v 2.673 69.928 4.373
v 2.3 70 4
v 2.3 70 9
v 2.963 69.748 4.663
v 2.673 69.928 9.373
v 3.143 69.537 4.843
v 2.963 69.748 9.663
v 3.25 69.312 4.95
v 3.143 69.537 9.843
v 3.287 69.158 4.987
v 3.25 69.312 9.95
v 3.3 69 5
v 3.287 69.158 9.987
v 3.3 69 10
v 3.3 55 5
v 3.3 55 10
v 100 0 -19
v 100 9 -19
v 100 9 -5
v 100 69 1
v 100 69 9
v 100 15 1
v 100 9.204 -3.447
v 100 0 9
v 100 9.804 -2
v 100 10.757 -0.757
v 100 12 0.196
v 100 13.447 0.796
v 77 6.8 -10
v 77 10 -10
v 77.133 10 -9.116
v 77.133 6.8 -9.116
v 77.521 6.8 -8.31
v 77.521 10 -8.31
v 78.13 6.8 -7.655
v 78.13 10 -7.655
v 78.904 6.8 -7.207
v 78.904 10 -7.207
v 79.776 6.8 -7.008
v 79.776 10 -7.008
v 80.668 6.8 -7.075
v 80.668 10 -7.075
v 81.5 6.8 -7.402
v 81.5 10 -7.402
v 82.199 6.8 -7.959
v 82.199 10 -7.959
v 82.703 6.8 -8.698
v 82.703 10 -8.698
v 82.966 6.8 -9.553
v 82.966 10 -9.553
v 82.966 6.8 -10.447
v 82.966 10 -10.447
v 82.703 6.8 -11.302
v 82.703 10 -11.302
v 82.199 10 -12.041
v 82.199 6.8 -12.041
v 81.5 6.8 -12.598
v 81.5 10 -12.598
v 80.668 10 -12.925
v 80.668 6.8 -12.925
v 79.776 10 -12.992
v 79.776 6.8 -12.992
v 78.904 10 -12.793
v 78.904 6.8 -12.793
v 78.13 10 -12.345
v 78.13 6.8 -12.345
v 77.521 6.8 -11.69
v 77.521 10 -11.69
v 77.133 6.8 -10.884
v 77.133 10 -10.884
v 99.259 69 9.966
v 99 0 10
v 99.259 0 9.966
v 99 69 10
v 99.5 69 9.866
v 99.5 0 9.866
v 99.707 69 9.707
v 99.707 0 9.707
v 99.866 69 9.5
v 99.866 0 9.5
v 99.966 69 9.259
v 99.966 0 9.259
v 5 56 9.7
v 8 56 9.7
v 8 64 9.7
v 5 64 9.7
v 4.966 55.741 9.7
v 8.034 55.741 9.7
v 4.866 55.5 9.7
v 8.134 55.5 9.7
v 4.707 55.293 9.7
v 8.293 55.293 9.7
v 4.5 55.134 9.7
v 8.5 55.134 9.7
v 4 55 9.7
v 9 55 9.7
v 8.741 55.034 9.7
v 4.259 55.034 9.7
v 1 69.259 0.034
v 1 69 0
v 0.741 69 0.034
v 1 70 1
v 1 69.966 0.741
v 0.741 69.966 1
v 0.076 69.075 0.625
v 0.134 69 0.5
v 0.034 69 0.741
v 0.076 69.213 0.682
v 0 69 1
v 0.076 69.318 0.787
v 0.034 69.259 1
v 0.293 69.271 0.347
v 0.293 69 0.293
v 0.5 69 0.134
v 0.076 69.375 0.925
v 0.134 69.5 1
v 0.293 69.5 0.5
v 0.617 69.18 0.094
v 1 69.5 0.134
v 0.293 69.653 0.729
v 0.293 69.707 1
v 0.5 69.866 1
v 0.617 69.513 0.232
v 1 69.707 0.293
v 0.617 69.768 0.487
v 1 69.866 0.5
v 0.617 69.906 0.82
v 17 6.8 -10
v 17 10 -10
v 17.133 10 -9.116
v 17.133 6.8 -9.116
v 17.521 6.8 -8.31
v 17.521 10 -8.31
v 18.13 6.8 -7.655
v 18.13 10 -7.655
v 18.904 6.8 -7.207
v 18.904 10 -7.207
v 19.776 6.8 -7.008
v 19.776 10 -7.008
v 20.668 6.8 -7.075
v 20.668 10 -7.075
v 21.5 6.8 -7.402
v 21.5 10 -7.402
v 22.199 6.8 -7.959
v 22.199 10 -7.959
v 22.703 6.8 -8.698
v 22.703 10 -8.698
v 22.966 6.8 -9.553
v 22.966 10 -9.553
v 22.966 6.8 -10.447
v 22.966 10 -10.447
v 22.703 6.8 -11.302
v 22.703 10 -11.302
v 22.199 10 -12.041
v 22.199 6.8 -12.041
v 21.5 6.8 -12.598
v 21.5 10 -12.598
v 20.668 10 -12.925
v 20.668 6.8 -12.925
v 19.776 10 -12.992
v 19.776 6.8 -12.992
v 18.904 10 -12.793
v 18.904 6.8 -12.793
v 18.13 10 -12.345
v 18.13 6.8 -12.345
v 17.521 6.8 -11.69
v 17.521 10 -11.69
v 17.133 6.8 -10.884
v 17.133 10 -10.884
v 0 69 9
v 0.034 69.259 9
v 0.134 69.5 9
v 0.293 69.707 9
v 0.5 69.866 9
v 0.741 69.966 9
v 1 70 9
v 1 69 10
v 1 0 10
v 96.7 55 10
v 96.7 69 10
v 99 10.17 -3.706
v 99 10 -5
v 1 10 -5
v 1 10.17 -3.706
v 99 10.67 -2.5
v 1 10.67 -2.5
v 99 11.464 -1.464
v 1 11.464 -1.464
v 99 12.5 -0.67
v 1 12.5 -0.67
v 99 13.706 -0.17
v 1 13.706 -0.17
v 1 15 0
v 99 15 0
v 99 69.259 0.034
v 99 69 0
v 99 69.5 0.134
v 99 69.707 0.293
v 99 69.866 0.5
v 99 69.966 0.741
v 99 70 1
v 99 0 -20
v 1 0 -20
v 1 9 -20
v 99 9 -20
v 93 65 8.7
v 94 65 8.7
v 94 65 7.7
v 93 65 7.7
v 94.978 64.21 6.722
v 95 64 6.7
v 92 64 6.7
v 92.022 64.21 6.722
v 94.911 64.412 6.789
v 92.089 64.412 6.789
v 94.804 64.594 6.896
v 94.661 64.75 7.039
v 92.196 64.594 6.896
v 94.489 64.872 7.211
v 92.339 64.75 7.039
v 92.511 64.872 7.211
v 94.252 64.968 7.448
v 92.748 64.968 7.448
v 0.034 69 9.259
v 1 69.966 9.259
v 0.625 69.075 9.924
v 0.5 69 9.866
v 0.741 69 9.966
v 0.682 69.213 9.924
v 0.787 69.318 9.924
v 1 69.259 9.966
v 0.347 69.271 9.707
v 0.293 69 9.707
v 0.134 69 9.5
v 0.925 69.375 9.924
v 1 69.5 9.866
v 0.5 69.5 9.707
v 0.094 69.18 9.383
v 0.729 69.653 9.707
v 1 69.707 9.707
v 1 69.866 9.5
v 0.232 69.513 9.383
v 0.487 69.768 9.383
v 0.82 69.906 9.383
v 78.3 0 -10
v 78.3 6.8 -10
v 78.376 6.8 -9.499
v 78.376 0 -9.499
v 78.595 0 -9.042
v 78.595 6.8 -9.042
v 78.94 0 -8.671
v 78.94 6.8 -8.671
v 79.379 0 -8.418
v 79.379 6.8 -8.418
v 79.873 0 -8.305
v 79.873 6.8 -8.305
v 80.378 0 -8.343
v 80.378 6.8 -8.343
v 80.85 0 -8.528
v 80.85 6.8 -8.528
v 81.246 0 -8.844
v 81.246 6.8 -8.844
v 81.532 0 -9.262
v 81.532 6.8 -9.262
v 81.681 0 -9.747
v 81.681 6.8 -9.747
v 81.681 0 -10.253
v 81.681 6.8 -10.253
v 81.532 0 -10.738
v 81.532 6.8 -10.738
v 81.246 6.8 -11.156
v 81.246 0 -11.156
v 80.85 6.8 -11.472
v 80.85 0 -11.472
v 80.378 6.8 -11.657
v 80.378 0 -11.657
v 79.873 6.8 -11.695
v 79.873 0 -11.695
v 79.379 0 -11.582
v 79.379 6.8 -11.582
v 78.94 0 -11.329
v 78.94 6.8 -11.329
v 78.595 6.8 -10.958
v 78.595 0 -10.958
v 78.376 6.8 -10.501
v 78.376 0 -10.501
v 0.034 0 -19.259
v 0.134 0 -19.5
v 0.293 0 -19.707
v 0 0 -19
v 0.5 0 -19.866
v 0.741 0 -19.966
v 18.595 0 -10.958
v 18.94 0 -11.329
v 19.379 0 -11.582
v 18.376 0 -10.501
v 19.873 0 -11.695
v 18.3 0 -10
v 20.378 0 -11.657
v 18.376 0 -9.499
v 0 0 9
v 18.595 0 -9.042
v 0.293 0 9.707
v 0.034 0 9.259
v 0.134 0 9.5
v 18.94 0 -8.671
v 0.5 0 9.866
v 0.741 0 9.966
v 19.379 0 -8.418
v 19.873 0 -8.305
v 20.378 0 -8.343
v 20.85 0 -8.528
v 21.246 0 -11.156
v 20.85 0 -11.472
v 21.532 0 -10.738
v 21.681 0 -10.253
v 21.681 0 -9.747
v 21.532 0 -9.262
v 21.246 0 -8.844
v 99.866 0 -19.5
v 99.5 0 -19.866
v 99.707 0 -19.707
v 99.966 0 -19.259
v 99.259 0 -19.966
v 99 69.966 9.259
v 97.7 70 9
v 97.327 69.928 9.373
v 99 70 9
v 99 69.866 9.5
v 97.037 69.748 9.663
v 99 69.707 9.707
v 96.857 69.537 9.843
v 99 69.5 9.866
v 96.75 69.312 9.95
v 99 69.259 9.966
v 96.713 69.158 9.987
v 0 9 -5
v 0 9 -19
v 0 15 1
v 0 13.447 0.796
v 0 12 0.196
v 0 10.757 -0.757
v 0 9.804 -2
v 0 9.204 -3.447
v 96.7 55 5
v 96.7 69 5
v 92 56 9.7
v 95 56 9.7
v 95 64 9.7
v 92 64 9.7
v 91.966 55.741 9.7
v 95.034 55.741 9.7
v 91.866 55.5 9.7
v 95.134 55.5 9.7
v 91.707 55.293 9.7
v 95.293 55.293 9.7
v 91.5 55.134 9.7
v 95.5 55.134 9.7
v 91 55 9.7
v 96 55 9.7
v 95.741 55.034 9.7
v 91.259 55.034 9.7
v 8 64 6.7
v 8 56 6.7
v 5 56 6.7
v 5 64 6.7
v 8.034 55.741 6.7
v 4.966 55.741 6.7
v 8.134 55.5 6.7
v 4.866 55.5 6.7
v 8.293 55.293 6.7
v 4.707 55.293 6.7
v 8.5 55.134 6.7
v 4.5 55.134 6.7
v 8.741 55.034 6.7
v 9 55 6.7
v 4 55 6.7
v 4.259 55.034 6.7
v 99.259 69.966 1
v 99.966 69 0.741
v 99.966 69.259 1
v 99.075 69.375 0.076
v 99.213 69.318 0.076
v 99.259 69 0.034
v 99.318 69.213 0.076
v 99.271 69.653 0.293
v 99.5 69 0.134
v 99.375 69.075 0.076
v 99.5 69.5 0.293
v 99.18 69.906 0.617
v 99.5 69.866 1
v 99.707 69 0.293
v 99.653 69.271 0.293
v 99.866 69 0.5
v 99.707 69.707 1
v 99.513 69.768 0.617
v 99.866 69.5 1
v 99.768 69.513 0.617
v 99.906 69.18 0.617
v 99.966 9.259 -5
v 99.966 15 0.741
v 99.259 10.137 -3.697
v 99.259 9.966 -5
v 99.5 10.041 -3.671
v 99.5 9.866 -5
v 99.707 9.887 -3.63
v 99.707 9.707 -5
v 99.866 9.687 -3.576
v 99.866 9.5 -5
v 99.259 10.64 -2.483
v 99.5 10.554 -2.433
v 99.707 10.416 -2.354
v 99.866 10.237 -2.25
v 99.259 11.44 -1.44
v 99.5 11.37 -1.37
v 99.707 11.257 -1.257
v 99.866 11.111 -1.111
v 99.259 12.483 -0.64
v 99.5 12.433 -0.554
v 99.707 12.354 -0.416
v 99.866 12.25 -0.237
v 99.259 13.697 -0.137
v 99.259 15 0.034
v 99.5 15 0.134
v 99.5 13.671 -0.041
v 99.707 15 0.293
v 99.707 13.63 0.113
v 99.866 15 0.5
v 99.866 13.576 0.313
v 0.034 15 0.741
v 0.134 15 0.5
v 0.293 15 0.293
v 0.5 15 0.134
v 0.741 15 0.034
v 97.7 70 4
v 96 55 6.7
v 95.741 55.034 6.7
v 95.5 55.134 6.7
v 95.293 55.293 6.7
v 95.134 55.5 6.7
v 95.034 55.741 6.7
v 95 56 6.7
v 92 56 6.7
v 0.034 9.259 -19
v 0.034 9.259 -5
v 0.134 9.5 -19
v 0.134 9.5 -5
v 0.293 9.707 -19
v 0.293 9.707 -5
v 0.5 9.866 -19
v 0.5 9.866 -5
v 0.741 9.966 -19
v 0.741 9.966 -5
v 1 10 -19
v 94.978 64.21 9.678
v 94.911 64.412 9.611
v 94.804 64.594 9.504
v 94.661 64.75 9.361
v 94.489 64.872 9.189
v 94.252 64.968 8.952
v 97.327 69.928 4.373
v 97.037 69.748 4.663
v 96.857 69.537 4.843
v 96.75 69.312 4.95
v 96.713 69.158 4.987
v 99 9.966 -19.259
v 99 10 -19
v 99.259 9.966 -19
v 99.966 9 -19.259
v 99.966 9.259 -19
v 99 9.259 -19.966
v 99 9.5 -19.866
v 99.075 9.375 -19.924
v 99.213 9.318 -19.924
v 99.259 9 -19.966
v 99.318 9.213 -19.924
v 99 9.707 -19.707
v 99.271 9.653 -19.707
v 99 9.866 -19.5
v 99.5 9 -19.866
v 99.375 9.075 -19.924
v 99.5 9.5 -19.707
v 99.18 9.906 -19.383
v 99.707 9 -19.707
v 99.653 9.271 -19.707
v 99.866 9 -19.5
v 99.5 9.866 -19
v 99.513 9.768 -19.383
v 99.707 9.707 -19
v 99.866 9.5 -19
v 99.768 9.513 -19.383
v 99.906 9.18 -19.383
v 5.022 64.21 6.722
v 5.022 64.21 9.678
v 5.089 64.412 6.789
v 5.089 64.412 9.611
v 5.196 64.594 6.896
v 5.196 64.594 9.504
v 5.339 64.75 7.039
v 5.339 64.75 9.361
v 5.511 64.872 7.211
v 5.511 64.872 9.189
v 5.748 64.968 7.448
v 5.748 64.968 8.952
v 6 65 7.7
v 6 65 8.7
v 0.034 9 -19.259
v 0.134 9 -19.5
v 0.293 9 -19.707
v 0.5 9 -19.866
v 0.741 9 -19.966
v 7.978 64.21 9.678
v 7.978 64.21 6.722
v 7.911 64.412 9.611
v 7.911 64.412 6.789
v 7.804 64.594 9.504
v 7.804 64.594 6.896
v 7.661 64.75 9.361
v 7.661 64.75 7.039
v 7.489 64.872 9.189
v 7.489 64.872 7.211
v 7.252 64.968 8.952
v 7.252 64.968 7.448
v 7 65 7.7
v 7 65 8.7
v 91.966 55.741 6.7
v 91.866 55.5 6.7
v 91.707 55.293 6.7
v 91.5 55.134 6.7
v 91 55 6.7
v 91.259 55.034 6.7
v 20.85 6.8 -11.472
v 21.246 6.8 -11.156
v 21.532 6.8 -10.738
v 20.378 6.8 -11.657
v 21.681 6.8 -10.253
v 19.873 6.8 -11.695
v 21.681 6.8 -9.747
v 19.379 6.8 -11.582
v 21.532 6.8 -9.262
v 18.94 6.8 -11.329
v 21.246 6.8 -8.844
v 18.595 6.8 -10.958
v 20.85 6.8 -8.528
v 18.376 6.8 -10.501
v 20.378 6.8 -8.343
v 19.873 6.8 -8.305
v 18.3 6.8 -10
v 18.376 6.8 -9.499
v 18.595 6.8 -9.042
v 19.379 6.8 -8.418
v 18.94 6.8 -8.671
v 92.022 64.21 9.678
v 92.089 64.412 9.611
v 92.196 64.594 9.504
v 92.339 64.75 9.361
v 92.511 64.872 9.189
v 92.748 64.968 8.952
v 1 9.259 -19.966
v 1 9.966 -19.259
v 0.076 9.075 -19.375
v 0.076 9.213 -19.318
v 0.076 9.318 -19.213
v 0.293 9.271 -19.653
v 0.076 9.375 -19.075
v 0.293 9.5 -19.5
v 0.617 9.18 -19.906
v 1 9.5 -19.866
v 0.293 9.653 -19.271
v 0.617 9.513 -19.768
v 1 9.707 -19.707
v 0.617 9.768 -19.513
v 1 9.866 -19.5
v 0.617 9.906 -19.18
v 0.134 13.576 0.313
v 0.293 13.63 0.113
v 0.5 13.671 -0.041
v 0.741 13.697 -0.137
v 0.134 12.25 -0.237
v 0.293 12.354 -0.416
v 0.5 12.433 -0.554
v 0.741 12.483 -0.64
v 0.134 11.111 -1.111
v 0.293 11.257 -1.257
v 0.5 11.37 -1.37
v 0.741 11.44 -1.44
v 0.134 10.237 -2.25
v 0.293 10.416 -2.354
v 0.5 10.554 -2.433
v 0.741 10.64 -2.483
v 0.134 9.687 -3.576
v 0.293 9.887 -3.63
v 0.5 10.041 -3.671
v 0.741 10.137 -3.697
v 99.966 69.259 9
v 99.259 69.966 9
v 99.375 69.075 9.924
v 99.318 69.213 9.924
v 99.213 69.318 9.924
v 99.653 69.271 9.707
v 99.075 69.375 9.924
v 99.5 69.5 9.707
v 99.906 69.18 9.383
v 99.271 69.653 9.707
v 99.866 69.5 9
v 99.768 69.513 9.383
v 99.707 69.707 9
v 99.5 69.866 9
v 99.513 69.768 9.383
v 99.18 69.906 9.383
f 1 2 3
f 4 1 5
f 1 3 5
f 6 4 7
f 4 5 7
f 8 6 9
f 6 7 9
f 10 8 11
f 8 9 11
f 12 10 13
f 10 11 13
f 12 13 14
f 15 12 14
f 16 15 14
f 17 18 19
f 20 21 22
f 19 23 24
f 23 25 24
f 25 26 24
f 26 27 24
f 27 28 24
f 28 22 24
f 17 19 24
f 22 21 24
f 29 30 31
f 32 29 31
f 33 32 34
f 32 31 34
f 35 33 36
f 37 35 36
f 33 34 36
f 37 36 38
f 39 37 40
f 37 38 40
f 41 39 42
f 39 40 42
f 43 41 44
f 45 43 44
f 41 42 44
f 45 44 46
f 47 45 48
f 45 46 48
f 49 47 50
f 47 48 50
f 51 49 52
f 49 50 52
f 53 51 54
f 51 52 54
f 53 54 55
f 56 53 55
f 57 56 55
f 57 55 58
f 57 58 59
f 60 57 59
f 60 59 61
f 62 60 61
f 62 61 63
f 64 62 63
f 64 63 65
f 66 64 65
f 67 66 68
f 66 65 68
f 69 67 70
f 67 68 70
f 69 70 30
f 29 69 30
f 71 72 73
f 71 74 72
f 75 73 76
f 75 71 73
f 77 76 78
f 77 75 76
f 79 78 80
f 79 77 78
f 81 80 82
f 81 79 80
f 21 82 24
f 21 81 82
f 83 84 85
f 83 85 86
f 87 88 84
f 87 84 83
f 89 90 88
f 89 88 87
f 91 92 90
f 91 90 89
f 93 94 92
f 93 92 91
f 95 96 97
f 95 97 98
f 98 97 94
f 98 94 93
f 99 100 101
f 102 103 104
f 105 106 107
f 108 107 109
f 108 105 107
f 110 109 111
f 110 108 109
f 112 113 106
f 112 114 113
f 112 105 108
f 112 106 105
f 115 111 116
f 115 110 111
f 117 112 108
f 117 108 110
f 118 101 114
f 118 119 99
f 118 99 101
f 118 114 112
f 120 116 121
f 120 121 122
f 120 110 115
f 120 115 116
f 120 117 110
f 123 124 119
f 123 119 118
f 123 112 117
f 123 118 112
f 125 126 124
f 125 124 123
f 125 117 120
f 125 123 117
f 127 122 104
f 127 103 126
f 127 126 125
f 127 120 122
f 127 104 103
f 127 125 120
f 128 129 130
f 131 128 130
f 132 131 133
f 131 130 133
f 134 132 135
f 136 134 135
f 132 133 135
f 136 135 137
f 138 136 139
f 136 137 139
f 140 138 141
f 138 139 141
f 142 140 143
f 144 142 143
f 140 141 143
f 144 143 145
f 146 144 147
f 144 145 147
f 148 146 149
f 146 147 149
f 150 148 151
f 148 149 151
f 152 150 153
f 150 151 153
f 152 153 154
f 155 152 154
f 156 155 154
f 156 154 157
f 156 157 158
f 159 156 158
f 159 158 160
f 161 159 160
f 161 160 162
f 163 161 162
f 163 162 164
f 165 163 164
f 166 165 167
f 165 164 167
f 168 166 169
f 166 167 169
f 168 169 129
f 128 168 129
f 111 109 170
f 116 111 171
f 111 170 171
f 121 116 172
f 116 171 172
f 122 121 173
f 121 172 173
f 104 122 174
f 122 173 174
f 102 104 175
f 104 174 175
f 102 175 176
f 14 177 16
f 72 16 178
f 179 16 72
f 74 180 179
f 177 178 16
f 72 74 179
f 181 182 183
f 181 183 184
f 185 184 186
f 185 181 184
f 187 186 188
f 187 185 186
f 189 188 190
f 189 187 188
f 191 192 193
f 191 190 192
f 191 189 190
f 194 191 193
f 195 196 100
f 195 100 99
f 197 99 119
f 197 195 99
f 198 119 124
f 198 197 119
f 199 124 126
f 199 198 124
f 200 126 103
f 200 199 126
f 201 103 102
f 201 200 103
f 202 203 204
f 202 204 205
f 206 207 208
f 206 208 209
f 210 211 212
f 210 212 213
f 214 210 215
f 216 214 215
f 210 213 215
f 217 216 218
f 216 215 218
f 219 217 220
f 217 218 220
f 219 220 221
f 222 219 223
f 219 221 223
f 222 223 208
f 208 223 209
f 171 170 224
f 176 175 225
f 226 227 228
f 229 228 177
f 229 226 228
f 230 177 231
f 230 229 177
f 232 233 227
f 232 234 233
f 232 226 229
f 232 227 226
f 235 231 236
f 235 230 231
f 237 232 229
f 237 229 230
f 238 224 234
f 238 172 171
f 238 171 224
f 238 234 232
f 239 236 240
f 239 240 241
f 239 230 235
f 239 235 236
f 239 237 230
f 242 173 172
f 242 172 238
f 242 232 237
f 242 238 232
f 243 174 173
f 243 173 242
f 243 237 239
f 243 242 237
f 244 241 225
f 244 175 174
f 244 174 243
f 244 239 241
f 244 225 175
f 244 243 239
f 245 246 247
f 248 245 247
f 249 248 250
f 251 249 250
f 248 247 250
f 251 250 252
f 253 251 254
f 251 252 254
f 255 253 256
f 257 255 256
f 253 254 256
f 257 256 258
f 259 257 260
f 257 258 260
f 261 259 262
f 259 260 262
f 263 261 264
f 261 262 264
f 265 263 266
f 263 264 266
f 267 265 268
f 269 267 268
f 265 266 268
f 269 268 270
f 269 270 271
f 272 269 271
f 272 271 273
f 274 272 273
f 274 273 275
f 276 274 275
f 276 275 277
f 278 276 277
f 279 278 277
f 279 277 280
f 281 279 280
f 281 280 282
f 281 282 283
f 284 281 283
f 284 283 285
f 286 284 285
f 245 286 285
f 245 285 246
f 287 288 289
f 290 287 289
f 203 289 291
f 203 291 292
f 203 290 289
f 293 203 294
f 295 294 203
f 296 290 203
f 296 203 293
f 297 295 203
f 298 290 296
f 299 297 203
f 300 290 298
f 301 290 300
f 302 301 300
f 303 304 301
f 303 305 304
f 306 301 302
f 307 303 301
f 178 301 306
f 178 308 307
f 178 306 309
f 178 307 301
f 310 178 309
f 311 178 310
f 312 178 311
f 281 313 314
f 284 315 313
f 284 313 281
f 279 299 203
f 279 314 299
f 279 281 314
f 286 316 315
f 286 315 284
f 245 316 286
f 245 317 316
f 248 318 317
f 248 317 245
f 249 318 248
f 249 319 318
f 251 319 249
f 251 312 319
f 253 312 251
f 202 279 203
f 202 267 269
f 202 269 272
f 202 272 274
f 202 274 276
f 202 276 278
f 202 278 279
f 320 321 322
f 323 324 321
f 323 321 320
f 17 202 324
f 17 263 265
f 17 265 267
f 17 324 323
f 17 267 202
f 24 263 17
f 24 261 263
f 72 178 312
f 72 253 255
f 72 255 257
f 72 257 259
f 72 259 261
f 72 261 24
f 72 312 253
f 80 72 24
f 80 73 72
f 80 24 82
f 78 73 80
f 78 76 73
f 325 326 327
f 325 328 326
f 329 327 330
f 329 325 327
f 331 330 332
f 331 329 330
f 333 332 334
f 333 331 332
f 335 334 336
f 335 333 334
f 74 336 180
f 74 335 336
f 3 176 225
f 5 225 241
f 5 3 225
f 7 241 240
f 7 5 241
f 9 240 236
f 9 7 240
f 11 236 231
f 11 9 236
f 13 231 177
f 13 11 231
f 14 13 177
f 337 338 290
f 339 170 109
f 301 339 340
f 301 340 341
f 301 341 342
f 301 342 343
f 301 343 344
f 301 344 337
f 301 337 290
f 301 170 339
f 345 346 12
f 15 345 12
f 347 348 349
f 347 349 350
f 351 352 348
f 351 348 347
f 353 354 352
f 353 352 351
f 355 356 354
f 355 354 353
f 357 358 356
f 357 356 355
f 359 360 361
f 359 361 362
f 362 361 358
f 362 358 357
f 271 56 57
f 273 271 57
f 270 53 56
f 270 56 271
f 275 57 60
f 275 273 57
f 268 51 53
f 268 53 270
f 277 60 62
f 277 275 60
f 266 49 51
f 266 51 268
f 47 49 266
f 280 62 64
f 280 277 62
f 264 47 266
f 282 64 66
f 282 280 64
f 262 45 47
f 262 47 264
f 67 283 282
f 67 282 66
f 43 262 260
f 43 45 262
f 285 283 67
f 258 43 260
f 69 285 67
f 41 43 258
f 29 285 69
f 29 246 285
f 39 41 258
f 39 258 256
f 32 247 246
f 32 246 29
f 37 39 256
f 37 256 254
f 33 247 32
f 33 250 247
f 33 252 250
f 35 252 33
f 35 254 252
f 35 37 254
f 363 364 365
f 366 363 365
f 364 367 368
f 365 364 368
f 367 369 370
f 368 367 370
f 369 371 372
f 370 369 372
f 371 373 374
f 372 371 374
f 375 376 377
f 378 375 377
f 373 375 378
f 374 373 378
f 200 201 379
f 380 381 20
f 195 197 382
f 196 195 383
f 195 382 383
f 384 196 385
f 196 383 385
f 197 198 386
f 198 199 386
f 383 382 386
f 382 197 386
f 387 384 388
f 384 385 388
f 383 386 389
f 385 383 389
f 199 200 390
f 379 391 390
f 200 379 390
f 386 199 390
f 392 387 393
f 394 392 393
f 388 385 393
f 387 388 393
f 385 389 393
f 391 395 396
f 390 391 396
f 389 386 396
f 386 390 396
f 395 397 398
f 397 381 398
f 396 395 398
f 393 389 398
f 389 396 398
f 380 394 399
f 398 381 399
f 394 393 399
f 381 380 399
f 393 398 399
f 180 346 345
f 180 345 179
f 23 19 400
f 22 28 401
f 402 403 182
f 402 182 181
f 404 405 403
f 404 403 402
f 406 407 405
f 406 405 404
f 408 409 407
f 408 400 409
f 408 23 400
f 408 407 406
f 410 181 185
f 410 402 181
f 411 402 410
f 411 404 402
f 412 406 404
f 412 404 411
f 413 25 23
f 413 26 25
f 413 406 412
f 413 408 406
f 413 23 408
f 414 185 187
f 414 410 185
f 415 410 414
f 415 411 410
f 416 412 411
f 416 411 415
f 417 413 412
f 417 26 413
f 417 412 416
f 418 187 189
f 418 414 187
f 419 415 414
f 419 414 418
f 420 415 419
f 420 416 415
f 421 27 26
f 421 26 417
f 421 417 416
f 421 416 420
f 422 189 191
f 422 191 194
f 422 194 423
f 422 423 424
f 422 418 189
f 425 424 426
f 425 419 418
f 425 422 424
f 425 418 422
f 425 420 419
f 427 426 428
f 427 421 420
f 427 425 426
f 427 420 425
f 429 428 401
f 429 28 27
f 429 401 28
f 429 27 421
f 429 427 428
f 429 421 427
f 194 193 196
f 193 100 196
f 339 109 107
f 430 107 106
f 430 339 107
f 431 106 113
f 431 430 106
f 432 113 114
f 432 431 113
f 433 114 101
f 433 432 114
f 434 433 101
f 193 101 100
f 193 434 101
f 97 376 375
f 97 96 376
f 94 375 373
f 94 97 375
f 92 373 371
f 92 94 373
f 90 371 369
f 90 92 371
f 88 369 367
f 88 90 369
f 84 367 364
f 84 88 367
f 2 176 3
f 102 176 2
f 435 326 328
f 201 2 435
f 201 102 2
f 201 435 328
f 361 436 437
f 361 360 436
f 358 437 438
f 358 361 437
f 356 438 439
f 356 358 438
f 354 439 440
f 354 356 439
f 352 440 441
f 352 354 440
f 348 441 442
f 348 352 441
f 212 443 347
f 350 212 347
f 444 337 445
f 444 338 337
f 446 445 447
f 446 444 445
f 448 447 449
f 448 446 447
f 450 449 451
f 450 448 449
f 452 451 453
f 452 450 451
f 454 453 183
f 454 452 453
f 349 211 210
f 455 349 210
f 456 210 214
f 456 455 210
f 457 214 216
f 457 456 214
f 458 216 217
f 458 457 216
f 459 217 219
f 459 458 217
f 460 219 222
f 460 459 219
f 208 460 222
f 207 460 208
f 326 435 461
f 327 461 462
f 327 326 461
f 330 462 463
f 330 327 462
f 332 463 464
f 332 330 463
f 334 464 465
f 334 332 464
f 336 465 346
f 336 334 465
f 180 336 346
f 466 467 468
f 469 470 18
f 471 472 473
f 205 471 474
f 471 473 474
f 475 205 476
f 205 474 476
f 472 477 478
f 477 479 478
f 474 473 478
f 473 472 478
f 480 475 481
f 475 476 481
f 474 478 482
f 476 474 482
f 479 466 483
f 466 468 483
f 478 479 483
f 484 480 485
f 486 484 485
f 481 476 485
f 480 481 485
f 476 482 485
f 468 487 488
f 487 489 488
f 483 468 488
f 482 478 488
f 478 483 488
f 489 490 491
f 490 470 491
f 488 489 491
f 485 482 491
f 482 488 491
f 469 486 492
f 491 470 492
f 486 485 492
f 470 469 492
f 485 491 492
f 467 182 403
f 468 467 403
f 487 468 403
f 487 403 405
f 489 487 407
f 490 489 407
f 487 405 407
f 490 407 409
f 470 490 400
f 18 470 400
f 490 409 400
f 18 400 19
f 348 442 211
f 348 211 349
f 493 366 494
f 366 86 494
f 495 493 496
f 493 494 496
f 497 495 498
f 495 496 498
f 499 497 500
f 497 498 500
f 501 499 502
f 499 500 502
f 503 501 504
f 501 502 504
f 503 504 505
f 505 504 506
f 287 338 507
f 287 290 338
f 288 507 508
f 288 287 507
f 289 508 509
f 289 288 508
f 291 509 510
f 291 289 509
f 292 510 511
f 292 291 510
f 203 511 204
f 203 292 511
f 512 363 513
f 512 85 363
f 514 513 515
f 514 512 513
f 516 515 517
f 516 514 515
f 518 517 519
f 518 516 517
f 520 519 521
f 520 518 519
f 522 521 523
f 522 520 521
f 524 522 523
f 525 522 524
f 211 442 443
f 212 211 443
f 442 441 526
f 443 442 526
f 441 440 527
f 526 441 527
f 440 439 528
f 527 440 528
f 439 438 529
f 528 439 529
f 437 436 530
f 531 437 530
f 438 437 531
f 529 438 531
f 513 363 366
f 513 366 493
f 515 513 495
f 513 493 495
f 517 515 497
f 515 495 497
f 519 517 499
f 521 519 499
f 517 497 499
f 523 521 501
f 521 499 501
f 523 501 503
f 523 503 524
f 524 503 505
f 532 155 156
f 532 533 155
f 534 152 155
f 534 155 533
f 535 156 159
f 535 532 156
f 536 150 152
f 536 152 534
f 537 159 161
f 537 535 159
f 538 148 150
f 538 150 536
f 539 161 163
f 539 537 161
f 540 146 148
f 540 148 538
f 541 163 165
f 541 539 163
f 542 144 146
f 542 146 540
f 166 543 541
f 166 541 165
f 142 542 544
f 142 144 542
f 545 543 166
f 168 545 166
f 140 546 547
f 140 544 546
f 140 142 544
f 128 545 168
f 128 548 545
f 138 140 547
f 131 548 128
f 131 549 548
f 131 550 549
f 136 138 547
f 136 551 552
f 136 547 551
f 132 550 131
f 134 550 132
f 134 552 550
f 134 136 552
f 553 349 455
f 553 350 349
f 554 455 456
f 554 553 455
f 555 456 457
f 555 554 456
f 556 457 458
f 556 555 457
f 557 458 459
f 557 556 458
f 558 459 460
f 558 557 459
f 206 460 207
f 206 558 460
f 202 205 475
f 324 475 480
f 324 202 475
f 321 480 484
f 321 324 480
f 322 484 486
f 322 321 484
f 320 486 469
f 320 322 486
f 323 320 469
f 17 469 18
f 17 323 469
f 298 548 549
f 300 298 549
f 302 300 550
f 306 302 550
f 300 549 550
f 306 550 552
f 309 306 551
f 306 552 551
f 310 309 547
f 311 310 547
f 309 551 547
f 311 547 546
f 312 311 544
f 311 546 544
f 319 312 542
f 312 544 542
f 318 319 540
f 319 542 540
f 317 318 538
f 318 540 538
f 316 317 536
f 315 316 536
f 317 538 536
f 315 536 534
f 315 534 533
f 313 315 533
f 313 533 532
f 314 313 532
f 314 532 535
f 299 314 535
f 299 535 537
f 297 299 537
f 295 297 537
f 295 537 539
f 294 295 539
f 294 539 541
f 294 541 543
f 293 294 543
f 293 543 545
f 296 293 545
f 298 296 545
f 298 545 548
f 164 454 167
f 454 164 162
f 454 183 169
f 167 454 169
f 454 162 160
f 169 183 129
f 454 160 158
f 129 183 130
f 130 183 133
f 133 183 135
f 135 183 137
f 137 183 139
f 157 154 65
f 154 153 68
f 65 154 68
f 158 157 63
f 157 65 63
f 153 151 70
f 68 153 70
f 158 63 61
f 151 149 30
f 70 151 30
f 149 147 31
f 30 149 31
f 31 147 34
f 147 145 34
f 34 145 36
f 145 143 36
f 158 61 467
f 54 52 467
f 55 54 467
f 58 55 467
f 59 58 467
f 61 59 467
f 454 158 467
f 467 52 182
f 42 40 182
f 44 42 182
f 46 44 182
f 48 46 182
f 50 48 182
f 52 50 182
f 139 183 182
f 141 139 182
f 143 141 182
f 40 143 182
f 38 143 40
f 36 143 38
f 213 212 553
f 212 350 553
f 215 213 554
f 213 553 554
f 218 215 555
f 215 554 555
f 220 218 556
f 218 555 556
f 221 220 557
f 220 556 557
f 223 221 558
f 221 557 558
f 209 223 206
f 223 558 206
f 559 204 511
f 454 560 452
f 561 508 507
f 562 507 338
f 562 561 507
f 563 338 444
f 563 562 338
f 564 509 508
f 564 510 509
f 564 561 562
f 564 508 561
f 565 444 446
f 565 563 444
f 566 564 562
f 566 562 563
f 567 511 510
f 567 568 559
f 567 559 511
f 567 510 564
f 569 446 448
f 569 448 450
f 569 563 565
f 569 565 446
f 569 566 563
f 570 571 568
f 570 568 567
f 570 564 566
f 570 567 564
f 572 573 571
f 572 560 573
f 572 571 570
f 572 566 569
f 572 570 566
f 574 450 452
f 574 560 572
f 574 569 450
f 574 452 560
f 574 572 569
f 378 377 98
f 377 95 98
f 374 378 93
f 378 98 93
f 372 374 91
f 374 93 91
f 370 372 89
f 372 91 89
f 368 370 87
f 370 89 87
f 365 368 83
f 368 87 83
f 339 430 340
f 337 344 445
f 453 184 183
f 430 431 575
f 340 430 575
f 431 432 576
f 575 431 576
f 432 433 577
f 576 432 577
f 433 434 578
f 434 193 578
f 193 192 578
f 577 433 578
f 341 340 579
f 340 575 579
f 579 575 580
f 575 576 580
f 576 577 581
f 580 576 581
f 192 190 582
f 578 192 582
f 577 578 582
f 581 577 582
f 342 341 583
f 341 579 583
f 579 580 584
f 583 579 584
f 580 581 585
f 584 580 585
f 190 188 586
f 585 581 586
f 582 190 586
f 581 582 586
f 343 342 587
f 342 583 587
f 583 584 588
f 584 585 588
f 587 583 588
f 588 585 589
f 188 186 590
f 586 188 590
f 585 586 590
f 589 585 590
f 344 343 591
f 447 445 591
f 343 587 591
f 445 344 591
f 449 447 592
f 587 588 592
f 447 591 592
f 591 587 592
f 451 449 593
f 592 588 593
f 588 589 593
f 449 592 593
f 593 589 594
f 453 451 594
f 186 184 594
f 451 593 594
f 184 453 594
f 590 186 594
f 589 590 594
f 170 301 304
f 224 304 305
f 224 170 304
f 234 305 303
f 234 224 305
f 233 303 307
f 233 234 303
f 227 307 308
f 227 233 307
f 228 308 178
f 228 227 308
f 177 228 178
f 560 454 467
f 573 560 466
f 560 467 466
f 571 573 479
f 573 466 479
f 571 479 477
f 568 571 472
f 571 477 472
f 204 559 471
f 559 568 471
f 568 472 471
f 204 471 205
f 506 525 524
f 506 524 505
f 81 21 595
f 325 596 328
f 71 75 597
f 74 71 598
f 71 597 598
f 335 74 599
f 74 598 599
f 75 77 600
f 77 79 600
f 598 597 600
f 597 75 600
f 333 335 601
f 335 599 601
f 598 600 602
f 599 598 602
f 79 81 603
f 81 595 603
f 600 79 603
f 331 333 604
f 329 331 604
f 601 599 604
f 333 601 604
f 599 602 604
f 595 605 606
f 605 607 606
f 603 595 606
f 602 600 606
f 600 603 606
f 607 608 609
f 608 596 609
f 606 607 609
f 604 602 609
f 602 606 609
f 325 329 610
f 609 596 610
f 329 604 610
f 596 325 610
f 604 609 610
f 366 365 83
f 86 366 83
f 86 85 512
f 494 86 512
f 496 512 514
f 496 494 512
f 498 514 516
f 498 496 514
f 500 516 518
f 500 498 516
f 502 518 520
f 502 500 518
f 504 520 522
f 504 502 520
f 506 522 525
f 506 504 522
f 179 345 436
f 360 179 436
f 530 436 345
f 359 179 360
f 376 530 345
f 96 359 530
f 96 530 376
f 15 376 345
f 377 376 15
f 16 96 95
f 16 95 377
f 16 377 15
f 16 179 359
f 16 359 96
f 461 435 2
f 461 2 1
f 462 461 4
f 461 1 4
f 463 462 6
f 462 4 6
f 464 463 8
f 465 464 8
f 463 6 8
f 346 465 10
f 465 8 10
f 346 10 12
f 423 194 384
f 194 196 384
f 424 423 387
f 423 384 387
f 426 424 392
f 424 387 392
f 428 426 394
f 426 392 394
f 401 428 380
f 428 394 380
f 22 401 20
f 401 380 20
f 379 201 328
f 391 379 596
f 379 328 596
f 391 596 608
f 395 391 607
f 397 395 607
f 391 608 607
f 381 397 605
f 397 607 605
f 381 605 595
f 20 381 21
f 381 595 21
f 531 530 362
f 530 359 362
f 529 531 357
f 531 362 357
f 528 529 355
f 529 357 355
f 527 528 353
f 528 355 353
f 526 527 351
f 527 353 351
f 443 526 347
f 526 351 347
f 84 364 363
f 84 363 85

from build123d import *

# Parameters (mm, degrees)
SKETCH_W        = 100
SKETCH_H        = 70
PAD_DEPTH       = 10
SKETCH001_W     = 100
SKETCH001_H     = 10
PAD001_DEPTH    = 20
SKETCH002_W     = 93.4
SKETCH002_H     = 5
POCKET_DEPTH    = 15
SKETCH003_W     = 3
SKETCH003_H     = 3
PAD002_DEPTH    = 10
SKETCH004_R     = 1.7
POCKET001_DEPTH = 15
SKETCH005_R     = 3
POCKET002_DEPTH = 3.2
FILLET_R        = 5
FILLET001_R     = 1
FILLET002_R     = 1


with BuildPart() as part:
    # Sketch → Pad (new body)
    with BuildSketch(Plane.XY):
        with Locations((50, 35)):
            Rectangle(SKETCH_W, SKETCH_H)
    extrude(amount=PAD_DEPTH)

    # Sketch001 → Pad001 (new body)
    with BuildSketch(Plane(origin=(0, 0, 0), x_dir=(1, 0, 0), z_dir=(0, 0, -1))):
        with Locations((50, -5)):
            Rectangle(SKETCH001_W, SKETCH001_H)
    extrude(amount=PAD001_DEPTH)

    # Sketch002 → Pocket (cut)
    with BuildSketch(Plane(origin=(0, 70, 0), x_dir=(-1, 0, 0), z_dir=(0, 1, 0))):
        with Locations((-50, 7.5)):
            Rectangle(SKETCH002_W, SKETCH002_H)
    extrude(amount=-POCKET_DEPTH, mode=Mode.SUBTRACT)

    # Sketch003 → Pad002 (new body)
    with BuildSketch(Plane(origin=(0, 55, 0), x_dir=(-1, 0, 0), z_dir=(0, 1, 0))):
        with Locations((-6.5, 8.2)):
            Rectangle(SKETCH003_W, SKETCH003_H)
        with Locations((-93.5, 8.2)):
            Rectangle(SKETCH003_W, SKETCH003_H)
    extrude(amount=PAD002_DEPTH)

    # Sketch004 → Pocket001 (cut)
    with BuildSketch(Plane(origin=(0, 10, 0), x_dir=(-1, 0, 0), z_dir=(0, 1, 0))):
        with Locations((-20, -10)):
            Circle(SKETCH004_R)
        with Locations((-80, -10)):
            Circle(SKETCH004_R)
    extrude(amount=-POCKET001_DEPTH, mode=Mode.SUBTRACT)

    # Sketch005 → Pocket002 (cut)
    with BuildSketch(Plane(origin=(0, 10, 0), x_dir=(-1, 0, 0), z_dir=(0, 1, 0))):
        with Locations((-20, -10)):
            Circle(SKETCH005_R)
        with Locations((-80, -10)):
            Circle(SKETCH005_R)
    extrude(amount=-POCKET002_DEPTH, mode=Mode.SUBTRACT)

    # Fillet
    fillet_edges = [part.edges().sort_by_distance(p)[0] for p in [
        (50, 10, 0),
    ]]
    fillet(fillet_edges, radius=FILLET_R)

    # Fillet001
    fillet001_edges = [part.edges().sort_by_distance(p)[0] for p in [
        (100, 70, 5),
        (50, 70, 0),
        (100, 42.5, 0),
        (100, 35, 10),
        (100, 11.464466, -1.464466),
        (100, 10, -12.5),
        (50, 10, -20),
        (100, 5, -20),
        (0, 5, -20),
        (0, 10, -12.5),
        (0, 11.464466, -1.464466),
        (0, 42.5, 0),
        (0, 70, 5),
        (0, 35, 10),
        (1.65, 70, 10),
        (98.35, 70, 10),
        (92, 65, 8.2),
        (93.5, 65, 6.7),
        (95, 65, 8.2),
        (93.5, 65, 9.7),
        (5, 65, 8.2),
        (6.5, 65, 6.7),
        (8, 65, 8.2),
        (6.5, 65, 9.7),
        (3.3, 70, 7.5),
        (50, 70, 5),
        (96.7, 70, 7.5),
    ]]
    fillet(fillet001_edges, radius=FILLET001_R)

    # Fillet002
    fillet002_edges = [part.edges().sort_by_distance(p)[0] for p in [
        (95, 55, 8.2),
        (92, 55, 8.2),
        (8, 55, 8.2),
        (5, 55, 8.2),
    ]]
    fillet(fillet002_edges, radius=FILLET002_R)


solid = part.part
